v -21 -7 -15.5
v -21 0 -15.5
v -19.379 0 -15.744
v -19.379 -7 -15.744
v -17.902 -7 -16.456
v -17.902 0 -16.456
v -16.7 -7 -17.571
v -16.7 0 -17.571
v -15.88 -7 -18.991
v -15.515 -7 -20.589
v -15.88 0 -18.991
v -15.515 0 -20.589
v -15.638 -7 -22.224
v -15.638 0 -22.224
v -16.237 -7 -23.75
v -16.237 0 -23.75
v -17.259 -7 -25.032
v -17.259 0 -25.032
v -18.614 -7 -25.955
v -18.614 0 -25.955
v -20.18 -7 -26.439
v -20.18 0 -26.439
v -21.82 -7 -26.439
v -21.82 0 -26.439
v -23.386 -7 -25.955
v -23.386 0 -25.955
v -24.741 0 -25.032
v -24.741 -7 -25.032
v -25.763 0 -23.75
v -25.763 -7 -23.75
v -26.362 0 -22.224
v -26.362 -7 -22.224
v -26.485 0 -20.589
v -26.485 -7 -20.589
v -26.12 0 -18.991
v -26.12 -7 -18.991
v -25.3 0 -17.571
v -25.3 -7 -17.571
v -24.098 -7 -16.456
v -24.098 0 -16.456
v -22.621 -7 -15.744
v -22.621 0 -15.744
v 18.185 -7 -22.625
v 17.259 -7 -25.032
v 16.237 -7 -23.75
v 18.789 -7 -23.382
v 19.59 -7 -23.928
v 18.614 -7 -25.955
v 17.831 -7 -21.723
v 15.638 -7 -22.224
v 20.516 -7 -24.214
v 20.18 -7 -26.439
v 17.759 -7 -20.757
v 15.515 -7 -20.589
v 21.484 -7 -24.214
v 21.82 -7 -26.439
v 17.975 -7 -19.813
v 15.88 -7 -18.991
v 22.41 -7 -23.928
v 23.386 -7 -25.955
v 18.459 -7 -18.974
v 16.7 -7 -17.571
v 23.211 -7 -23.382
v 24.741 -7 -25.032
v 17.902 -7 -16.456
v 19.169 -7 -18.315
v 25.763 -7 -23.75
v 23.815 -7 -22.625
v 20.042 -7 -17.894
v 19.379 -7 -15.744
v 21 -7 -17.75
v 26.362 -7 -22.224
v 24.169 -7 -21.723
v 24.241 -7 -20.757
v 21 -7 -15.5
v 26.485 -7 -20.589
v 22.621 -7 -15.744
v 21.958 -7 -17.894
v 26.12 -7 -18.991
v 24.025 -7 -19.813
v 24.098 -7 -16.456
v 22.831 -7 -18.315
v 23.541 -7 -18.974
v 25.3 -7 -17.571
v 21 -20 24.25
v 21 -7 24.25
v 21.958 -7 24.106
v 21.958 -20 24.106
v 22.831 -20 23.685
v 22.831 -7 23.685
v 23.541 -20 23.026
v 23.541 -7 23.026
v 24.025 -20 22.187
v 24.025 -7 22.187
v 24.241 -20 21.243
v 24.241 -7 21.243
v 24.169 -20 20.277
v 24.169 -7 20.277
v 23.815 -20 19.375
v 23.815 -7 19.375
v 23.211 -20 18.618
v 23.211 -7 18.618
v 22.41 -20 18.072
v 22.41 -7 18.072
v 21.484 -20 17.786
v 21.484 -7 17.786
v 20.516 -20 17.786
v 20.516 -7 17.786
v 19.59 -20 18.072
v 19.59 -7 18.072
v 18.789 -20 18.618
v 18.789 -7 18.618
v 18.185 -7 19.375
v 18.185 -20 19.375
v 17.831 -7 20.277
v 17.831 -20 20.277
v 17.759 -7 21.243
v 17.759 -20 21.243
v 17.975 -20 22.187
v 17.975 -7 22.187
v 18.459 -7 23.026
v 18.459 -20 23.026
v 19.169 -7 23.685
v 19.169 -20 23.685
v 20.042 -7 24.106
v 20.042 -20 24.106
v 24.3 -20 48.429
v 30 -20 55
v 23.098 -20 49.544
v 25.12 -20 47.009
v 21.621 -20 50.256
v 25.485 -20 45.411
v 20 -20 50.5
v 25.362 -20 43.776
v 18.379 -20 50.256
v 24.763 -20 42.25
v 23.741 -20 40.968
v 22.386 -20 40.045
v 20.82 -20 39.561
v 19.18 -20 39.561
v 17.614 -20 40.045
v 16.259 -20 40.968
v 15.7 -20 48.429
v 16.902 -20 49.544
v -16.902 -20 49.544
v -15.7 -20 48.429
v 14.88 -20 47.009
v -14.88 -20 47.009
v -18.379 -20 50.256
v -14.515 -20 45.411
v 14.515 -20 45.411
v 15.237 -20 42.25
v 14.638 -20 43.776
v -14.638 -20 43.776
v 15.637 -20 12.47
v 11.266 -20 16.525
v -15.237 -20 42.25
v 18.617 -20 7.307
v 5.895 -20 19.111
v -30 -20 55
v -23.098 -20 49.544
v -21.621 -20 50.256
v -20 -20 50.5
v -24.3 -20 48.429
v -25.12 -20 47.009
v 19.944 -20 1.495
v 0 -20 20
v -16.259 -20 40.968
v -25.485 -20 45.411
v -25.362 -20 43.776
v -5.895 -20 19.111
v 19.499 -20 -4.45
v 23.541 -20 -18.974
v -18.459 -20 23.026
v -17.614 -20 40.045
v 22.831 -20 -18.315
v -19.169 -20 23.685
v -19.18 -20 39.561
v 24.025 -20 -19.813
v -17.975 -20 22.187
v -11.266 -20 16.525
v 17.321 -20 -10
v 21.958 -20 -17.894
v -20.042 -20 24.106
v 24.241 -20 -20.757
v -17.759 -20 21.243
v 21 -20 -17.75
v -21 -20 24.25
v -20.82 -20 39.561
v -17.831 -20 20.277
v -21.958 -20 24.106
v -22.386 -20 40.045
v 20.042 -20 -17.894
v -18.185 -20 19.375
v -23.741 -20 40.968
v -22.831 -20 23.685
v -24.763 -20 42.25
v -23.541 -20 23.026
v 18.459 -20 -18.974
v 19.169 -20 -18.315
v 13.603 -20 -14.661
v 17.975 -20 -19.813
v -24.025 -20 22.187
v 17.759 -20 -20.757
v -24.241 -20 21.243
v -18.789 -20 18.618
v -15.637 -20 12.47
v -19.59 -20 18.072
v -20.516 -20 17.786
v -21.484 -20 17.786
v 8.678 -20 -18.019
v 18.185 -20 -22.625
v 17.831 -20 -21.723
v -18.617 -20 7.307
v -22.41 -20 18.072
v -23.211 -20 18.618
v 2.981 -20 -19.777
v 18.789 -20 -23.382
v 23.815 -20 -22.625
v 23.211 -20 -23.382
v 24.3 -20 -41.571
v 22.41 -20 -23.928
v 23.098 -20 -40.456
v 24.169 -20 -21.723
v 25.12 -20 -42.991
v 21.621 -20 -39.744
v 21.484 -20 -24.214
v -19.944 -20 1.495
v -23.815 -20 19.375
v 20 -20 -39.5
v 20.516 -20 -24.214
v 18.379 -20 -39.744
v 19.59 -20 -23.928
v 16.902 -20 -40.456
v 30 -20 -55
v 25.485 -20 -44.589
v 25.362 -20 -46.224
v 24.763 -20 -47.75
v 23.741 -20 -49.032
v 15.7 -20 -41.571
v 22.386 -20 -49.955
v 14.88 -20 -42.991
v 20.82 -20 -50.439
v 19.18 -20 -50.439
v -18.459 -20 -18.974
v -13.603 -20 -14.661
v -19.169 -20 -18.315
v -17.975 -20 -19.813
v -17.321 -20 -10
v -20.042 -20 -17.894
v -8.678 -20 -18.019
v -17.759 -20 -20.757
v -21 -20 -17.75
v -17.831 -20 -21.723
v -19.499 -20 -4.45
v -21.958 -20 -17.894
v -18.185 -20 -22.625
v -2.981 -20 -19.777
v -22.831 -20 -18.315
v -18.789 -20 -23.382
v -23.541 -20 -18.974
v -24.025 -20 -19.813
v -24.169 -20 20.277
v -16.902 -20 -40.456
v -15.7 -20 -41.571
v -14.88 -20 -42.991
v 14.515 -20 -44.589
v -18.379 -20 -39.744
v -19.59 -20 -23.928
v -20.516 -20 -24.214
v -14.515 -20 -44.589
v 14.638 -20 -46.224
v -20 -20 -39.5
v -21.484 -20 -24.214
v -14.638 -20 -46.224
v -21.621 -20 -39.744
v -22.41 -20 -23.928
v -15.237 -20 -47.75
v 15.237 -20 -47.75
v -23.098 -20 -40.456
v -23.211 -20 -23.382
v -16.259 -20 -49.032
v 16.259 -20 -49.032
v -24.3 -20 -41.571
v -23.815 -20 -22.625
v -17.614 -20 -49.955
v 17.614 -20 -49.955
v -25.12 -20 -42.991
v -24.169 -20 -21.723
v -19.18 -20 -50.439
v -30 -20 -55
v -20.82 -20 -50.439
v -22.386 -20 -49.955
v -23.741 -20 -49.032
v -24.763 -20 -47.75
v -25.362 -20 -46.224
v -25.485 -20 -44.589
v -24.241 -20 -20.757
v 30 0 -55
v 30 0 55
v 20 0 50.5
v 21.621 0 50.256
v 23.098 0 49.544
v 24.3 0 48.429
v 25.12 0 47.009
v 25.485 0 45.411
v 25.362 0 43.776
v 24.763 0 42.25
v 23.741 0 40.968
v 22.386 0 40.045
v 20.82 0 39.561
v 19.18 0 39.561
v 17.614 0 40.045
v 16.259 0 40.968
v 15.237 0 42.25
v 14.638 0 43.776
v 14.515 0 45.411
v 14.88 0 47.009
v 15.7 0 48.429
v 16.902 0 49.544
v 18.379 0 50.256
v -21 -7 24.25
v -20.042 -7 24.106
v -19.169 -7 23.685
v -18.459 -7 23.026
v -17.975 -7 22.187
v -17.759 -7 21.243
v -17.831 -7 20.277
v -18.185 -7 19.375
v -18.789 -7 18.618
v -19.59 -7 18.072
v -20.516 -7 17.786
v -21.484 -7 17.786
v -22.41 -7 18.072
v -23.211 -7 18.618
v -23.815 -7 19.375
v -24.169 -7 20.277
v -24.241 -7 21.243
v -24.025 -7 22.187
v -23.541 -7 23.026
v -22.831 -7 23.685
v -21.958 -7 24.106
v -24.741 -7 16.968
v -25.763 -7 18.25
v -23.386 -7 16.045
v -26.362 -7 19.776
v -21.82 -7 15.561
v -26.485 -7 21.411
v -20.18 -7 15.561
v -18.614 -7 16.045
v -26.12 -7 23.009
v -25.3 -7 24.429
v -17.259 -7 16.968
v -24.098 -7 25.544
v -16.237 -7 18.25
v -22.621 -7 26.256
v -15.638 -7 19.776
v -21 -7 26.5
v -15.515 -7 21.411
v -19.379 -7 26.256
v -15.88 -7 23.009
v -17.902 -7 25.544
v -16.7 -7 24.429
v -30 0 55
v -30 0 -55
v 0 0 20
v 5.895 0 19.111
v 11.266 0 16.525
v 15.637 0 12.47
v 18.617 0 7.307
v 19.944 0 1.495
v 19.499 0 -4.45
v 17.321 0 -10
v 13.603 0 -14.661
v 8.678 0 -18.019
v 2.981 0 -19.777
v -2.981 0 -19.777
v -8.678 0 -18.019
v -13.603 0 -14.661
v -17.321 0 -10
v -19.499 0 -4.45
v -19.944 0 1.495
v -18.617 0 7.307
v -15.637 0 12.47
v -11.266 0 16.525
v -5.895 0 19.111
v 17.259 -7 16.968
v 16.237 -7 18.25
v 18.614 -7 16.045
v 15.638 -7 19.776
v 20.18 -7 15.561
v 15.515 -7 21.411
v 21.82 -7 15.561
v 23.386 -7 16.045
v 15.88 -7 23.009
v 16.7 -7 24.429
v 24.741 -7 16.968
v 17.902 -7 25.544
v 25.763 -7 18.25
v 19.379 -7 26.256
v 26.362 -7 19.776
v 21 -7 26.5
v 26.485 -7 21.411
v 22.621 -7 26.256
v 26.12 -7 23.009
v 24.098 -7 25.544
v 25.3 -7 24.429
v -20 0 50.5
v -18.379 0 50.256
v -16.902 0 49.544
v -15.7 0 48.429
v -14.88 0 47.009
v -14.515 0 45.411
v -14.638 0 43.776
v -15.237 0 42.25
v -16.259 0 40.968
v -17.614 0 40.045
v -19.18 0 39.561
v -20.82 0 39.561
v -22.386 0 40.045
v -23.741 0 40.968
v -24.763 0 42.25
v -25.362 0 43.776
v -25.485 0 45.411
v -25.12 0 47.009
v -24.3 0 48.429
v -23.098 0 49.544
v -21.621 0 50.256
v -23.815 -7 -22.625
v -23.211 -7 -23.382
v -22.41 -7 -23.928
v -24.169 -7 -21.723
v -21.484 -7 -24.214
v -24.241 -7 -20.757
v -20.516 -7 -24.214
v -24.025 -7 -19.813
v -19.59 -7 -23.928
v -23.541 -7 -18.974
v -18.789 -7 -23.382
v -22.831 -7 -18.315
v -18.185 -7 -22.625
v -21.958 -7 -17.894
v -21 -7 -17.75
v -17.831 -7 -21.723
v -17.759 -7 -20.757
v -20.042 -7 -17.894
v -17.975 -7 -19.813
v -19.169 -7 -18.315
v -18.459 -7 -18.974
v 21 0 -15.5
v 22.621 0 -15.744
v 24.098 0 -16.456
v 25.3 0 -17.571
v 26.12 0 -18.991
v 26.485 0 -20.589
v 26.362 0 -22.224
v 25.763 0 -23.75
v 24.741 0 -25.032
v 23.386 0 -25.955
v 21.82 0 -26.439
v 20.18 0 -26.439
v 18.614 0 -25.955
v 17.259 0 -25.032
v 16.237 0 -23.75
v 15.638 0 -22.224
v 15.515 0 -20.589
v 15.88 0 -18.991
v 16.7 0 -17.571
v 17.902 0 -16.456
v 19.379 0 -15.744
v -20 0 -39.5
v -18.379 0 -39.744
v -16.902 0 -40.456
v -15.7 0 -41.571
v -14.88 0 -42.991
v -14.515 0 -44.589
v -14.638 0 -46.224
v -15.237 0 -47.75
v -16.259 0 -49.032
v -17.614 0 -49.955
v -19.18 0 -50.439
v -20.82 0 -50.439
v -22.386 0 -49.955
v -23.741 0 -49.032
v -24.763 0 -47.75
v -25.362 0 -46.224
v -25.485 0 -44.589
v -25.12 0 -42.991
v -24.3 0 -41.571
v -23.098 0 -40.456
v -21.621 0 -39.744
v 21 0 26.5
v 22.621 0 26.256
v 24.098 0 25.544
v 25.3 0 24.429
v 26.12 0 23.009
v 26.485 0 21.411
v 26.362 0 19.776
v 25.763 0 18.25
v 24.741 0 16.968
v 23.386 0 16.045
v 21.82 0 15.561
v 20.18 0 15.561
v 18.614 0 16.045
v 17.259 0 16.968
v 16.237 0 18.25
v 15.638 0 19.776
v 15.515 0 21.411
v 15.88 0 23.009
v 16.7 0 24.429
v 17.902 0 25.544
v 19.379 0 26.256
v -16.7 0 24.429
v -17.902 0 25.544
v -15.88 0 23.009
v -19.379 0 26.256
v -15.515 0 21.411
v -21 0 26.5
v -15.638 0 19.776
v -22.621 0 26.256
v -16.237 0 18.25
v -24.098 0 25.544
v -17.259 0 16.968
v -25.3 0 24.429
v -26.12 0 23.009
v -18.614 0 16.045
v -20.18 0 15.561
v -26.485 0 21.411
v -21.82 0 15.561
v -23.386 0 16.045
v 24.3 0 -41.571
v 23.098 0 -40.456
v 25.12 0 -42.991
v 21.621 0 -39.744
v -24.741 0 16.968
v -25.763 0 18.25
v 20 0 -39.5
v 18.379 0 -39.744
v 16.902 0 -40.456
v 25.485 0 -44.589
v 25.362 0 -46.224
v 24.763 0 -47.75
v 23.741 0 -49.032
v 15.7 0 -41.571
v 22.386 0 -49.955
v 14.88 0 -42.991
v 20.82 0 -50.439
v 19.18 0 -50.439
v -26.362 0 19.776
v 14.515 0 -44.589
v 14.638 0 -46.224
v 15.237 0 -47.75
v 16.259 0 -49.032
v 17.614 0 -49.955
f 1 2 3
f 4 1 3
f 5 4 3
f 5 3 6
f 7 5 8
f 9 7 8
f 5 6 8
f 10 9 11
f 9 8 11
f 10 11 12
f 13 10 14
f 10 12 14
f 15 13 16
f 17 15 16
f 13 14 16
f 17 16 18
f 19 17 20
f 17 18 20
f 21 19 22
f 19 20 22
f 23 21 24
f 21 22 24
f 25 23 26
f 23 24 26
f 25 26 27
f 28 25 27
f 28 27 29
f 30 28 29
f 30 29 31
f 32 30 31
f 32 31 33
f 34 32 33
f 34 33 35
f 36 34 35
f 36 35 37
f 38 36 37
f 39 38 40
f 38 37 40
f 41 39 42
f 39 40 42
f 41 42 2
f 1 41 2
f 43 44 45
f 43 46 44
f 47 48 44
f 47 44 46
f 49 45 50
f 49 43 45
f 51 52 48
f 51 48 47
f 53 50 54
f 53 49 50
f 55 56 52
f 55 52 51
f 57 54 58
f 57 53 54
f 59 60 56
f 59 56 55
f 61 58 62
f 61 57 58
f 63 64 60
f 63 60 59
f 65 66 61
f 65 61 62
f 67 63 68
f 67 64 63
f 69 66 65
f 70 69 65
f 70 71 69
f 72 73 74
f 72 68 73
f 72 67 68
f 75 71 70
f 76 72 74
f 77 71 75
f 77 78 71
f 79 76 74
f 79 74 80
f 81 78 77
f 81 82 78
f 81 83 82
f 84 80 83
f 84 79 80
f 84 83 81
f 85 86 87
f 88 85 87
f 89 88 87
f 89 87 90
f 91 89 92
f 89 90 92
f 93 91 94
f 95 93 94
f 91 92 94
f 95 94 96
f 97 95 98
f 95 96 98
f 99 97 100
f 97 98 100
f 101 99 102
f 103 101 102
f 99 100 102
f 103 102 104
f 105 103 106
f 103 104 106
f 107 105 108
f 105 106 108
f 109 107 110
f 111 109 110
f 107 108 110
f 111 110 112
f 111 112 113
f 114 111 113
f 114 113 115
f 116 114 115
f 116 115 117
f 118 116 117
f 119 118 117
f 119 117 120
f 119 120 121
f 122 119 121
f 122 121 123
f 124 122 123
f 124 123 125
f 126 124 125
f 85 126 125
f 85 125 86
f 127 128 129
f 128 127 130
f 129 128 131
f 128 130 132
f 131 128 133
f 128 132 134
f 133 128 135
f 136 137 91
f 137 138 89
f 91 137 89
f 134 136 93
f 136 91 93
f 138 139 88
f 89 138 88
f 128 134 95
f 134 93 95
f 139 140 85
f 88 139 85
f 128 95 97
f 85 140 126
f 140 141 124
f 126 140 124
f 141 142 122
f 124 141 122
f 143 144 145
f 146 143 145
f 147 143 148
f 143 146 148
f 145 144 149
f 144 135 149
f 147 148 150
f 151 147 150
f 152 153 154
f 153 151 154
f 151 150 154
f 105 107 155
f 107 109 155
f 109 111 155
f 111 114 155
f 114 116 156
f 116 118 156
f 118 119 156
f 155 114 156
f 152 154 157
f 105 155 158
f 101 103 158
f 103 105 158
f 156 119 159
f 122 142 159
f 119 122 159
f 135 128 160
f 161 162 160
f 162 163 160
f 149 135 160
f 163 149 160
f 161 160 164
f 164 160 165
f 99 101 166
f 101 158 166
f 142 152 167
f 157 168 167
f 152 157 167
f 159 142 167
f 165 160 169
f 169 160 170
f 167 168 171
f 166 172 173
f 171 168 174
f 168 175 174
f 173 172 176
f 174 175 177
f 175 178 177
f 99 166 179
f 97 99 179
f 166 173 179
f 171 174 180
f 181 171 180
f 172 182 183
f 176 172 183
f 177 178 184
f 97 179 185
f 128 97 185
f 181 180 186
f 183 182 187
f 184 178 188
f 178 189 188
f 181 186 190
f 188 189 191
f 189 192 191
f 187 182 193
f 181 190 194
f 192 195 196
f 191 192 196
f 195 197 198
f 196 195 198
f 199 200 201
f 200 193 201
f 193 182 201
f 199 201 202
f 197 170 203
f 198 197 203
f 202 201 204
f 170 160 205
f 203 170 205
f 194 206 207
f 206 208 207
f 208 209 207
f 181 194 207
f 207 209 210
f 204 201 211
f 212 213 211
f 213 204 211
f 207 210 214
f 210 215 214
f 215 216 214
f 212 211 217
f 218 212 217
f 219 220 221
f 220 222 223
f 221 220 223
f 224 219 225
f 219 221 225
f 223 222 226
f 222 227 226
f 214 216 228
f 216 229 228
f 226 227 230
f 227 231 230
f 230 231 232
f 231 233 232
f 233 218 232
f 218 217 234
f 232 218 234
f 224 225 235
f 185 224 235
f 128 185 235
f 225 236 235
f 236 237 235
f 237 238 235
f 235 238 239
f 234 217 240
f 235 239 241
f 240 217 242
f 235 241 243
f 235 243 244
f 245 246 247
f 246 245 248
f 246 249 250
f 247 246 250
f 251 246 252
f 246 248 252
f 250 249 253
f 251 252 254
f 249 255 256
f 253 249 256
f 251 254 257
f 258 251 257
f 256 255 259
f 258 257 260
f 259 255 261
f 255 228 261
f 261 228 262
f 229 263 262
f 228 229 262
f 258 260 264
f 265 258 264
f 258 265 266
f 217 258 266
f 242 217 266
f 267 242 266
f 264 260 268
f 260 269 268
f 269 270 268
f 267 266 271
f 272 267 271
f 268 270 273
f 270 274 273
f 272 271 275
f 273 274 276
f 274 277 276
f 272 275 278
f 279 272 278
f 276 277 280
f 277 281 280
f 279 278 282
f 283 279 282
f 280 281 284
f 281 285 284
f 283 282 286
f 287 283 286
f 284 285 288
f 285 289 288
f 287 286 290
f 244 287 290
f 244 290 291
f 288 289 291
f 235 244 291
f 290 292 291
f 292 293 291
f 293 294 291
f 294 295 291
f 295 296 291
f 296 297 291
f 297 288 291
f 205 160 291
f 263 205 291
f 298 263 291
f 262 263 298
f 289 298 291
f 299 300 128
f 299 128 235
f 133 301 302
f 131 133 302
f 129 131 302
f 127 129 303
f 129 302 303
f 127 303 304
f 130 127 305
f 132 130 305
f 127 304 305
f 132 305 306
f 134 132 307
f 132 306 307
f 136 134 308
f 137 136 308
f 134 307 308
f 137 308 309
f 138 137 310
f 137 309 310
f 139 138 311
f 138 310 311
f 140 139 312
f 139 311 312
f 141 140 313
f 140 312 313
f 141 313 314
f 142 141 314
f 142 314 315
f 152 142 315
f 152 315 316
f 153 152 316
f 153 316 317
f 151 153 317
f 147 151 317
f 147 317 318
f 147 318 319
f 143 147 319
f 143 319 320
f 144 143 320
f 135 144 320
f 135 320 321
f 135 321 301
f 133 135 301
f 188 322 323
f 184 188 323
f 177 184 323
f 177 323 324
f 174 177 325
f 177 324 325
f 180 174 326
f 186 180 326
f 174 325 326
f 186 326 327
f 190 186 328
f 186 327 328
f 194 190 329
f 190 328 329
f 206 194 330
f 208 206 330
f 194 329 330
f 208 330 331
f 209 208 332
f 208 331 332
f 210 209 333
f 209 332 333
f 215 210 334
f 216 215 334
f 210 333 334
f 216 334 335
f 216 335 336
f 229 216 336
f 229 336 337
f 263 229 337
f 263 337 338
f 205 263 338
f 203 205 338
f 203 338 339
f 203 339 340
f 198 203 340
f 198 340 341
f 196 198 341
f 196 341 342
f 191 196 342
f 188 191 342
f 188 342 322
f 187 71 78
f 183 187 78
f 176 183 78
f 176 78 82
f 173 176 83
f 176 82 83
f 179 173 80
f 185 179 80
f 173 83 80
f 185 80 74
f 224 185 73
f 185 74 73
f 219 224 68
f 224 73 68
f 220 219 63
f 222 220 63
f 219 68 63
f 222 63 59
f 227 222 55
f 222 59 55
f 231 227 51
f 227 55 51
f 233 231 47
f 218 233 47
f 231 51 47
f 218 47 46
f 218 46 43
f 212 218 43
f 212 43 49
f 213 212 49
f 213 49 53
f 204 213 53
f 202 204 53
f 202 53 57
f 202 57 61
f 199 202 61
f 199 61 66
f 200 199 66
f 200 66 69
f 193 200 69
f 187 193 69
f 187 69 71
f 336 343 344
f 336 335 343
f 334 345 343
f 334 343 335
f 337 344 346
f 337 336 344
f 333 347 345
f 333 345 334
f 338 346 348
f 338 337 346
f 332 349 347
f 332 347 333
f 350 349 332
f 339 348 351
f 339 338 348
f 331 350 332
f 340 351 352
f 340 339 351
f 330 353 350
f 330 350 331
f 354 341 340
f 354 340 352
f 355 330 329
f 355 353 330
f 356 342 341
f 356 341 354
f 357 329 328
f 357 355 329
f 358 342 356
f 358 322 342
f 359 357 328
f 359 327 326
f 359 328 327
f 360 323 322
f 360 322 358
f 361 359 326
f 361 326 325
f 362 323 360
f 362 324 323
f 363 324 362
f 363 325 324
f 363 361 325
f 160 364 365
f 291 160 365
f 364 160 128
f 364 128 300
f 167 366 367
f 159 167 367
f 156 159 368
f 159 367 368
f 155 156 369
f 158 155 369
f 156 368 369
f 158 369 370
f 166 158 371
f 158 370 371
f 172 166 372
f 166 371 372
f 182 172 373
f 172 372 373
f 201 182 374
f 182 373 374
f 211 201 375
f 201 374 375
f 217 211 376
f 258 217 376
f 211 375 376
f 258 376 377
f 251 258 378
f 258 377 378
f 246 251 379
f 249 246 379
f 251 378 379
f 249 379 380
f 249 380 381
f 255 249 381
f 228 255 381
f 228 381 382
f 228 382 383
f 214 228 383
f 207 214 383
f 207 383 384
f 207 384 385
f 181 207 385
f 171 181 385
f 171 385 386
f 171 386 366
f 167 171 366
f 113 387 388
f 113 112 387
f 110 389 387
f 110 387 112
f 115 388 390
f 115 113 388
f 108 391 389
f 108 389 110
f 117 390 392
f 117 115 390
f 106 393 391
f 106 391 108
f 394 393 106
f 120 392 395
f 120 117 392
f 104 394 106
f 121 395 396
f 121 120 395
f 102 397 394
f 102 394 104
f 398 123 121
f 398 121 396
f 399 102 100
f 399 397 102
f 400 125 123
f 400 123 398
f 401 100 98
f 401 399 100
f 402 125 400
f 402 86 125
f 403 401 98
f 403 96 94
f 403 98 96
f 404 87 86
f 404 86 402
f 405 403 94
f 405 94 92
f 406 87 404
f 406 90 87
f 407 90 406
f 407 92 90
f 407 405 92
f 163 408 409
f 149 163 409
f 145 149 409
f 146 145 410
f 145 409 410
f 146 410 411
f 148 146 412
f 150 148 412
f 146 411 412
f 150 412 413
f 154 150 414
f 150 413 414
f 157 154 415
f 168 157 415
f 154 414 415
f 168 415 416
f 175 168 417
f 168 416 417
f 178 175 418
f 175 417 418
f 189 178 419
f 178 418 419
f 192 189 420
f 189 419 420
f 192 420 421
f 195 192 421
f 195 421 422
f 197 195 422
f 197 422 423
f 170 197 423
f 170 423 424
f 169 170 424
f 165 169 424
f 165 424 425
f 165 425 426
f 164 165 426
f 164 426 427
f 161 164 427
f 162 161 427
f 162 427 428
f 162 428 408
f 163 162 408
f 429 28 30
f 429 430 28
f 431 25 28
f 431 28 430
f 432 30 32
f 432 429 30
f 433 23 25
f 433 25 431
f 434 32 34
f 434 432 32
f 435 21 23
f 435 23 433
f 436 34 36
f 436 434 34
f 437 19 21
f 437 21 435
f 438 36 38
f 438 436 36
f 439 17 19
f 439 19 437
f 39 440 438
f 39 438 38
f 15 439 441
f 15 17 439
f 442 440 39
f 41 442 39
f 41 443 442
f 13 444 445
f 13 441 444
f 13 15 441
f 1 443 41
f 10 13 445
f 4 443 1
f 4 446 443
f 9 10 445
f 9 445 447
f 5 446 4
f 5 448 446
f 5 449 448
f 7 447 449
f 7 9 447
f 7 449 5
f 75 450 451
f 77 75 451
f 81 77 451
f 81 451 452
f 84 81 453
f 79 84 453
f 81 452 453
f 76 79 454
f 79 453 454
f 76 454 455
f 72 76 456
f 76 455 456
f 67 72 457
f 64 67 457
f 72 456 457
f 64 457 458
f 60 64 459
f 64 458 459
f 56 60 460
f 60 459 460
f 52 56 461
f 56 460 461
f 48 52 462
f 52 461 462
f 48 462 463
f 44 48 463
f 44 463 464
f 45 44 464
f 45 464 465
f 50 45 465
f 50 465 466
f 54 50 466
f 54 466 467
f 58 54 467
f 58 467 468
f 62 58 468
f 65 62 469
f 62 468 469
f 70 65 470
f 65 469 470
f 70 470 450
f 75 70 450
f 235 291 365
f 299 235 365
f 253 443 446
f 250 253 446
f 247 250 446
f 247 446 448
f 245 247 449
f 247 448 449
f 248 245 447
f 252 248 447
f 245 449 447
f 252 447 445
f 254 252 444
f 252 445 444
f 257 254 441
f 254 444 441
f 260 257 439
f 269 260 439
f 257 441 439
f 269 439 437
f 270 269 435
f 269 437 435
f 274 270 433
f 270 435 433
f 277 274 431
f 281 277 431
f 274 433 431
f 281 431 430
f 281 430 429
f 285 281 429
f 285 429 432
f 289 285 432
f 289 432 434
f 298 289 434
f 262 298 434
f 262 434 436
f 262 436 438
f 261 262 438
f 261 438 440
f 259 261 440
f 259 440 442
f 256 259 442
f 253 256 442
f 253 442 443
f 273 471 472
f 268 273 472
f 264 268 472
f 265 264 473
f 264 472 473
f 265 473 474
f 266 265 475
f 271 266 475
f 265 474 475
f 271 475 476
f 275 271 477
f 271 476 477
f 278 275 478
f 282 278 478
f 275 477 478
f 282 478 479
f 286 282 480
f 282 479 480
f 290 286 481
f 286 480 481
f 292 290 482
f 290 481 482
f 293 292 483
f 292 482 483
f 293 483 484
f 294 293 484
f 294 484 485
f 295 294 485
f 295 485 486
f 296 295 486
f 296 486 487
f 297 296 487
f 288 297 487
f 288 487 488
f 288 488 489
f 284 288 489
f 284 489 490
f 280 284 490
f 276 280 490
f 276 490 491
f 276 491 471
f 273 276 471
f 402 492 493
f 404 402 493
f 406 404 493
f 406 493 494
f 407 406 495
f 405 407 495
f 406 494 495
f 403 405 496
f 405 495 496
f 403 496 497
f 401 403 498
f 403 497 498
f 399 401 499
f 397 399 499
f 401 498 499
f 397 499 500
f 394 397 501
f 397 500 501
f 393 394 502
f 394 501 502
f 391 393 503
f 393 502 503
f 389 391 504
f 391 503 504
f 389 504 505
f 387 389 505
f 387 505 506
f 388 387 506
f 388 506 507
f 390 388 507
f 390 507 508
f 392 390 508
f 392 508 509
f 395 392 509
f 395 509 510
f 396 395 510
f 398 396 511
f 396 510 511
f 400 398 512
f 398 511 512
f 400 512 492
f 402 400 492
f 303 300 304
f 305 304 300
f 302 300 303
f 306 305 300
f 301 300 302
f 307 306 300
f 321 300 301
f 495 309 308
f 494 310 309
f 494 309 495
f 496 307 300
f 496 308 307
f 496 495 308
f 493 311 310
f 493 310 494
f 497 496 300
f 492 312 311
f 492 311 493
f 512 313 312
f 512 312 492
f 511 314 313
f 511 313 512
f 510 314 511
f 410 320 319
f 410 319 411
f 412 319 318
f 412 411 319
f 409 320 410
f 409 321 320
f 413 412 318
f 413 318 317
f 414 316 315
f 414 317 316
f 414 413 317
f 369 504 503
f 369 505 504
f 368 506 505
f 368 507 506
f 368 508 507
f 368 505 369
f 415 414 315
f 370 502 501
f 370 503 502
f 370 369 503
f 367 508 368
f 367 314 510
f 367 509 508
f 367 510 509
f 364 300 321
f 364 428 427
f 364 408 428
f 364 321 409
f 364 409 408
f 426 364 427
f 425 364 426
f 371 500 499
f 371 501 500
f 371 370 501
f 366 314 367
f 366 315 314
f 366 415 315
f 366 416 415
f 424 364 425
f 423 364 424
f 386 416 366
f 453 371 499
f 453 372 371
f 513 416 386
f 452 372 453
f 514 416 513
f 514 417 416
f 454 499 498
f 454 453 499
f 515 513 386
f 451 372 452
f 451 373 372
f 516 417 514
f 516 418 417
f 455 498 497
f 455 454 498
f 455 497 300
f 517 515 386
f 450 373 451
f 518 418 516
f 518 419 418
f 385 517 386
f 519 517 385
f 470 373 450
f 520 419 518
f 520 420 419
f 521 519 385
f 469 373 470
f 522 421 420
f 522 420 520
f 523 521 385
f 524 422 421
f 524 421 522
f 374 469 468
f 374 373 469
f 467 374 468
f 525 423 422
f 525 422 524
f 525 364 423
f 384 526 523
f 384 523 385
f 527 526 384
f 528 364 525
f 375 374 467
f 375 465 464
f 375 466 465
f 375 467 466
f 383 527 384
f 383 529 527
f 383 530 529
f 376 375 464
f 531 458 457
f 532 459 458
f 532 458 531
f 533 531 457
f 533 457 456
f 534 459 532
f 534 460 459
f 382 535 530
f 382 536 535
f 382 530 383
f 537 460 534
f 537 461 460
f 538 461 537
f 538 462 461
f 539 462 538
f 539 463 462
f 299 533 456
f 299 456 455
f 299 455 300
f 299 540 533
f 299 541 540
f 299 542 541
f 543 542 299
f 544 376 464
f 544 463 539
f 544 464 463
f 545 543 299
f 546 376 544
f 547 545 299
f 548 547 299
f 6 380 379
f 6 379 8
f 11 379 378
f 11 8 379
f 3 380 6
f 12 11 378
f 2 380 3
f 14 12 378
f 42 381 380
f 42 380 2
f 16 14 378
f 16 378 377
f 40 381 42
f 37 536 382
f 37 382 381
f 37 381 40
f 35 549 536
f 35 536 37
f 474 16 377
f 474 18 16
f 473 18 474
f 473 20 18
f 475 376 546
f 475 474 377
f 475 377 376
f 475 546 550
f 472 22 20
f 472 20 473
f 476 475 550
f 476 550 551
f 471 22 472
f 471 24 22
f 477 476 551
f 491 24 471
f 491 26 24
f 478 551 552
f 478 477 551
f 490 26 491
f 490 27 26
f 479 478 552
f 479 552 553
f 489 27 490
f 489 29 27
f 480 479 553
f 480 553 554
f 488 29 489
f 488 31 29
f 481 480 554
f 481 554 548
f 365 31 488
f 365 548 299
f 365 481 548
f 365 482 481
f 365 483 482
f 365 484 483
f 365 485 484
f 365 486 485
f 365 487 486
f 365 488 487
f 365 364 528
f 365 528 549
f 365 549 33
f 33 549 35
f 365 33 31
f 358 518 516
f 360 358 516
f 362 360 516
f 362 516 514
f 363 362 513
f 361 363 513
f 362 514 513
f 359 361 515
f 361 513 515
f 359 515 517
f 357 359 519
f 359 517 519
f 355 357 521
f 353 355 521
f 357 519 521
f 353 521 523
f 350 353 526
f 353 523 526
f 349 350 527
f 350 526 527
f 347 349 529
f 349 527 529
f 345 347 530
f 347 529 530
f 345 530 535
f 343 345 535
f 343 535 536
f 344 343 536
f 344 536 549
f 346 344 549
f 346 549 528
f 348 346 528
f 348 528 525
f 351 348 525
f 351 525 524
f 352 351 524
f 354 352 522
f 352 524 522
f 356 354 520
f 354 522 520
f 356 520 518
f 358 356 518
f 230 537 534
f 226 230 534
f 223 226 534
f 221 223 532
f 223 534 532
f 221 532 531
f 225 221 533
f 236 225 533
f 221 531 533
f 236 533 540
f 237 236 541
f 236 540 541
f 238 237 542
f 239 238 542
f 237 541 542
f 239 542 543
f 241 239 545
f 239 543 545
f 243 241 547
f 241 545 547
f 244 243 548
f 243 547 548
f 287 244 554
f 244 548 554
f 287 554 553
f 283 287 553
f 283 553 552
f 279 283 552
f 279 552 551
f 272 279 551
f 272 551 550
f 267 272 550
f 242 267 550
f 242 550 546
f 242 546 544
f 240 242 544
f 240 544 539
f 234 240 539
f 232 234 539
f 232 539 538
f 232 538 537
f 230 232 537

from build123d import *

# Parameters (mm, degrees)
SALIENTE_EXTRUIR1_DEPTH      = 30
SALIENTE_EXTRUIR1_DEPTH_BACK = 30
CROQUIS1_W                   = 110
CROQUIS1_H                   = 20
CORTAR_EXTRUIR1_REACH        = 67.765
CROQUIS2_R                   = 20
CROQUIS3_R                   = 5.5
CORTAR_EXTRUIR2_DEPTH        = 7
CORTAR_EXTRUIR3_REACH        = 65.984
CROQUIS4_R                   = 3.25
CORTAR_EXTRUIR4_REACH        = 67.765
CROQUIS5_R                   = 5.5


with BuildPart() as part:
    # Croquis1 → Saliente-Extruir1 (new, two sides: drawn at the far end of the back side and taken through both)
    with BuildSketch(Plane(origin=(0, 0, 0), x_dir=(0, 0, -1), z_dir=(1, 0, 0)).offset(-SALIENTE_EXTRUIR1_DEPTH_BACK)):
        with Locations((0, -10)):
            Rectangle(CROQUIS1_W, CROQUIS1_H)
    extrude(amount=SALIENTE_EXTRUIR1_DEPTH + SALIENTE_EXTRUIR1_DEPTH_BACK)

    # Croquis2 → Cortar-Extruir1 (cut, up to next)
    with BuildSketch(Plane(origin=(0, 0, 0), x_dir=(1, 0, 0), z_dir=(0, 1, 0)), mode=Mode.PRIVATE) as cortar_extruir1_sk1:
        Circle(CROQUIS2_R)
    cortar_extruir1_tool1 = extrude(cortar_extruir1_sk1.sketch, amount=-CORTAR_EXTRUIR1_REACH, mode=Mode.PRIVATE) & part.part
    add(cortar_extruir1_tool1.solids().sort_by_distance((0, 0, 0))[0], mode=Mode.SUBTRACT)

    # Croquis3 → Cortar-Extruir2 (cut)
    with BuildSketch(Plane(origin=(0, 0, 0), x_dir=(1, 0, 0), z_dir=(0, 1, 0))):
        with Locations((-21, 21)):
            Circle(CROQUIS3_R)
        with Locations((21, 21)):
            Circle(CROQUIS3_R)
        with Locations((21, -21)):
            Circle(CROQUIS3_R)
        with Locations((-21, -21)):
            Circle(CROQUIS3_R)
    extrude(amount=-CORTAR_EXTRUIR2_DEPTH, mode=Mode.SUBTRACT)

    # Croquis4 → Cortar-Extruir3 (cut, up to next)
    with BuildSketch(Plane(origin=(0, -7, 0), x_dir=(1, 0, 0), z_dir=(0, 1, 0)), mode=Mode.PRIVATE) as cortar_extruir3_sk1:
        with Locations((-21, 21)):
            Circle(CROQUIS4_R)
    cortar_extruir3_tool1 = extrude(cortar_extruir3_sk1.sketch, amount=-CORTAR_EXTRUIR3_REACH, mode=Mode.PRIVATE) & part.part
    # Croquis4 → Cortar-Extruir3 (cut, up to next)
    with BuildSketch(Plane(origin=(0, -7, 0), x_dir=(1, 0, 0), z_dir=(0, 1, 0)), mode=Mode.PRIVATE) as cortar_extruir3_sk2:
        with Locations((21, 21)):
            Circle(CROQUIS4_R)
    cortar_extruir3_tool2 = extrude(cortar_extruir3_sk2.sketch, amount=-CORTAR_EXTRUIR3_REACH, mode=Mode.PRIVATE) & part.part
    # Croquis4 → Cortar-Extruir3 (cut, up to next)
    with BuildSketch(Plane(origin=(0, -7, 0), x_dir=(1, 0, 0), z_dir=(0, 1, 0)), mode=Mode.PRIVATE) as cortar_extruir3_sk3:
        with Locations((21, -21)):
            Circle(CROQUIS4_R)
    cortar_extruir3_tool3 = extrude(cortar_extruir3_sk3.sketch, amount=-CORTAR_EXTRUIR3_REACH, mode=Mode.PRIVATE) & part.part
    # Croquis4 → Cortar-Extruir3 (cut, up to next)
    with BuildSketch(Plane(origin=(0, -7, 0), x_dir=(1, 0, 0), z_dir=(0, 1, 0)), mode=Mode.PRIVATE) as cortar_extruir3_sk4:
        with Locations((-21, -21)):
            Circle(CROQUIS4_R)
    cortar_extruir3_tool4 = extrude(cortar_extruir3_sk4.sketch, amount=-CORTAR_EXTRUIR3_REACH, mode=Mode.PRIVATE) & part.part
    add(cortar_extruir3_tool1.solids().sort_by_distance((-21, -7, -21))[0], mode=Mode.SUBTRACT)
    add(cortar_extruir3_tool2.solids().sort_by_distance((21, -7, -21))[0], mode=Mode.SUBTRACT)
    add(cortar_extruir3_tool3.solids().sort_by_distance((21, -7, 21))[0], mode=Mode.SUBTRACT)
    add(cortar_extruir3_tool4.solids().sort_by_distance((-21, -7, 21))[0], mode=Mode.SUBTRACT)

    # Croquis5 → Cortar-Extruir4 (cut, up to next)
    with BuildSketch(Plane(origin=(0, 0, 0), x_dir=(1, 0, 0), z_dir=(0, 1, 0)), mode=Mode.PRIVATE) as cortar_extruir4_sk1:
        with Locations((-20, 45)):
            Circle(CROQUIS5_R)
    cortar_extruir4_tool1 = extrude(cortar_extruir4_sk1.sketch, amount=-CORTAR_EXTRUIR4_REACH, mode=Mode.PRIVATE) & part.part
    # Croquis5 → Cortar-Extruir4 (cut, up to next)
    with BuildSketch(Plane(origin=(0, 0, 0), x_dir=(1, 0, 0), z_dir=(0, 1, 0)), mode=Mode.PRIVATE) as cortar_extruir4_sk2:
        with Locations((20, 45)):
            Circle(CROQUIS5_R)
    cortar_extruir4_tool2 = extrude(cortar_extruir4_sk2.sketch, amount=-CORTAR_EXTRUIR4_REACH, mode=Mode.PRIVATE) & part.part
    # Croquis5 → Cortar-Extruir4 (cut, up to next)
    with BuildSketch(Plane(origin=(0, 0, 0), x_dir=(1, 0, 0), z_dir=(0, 1, 0)), mode=Mode.PRIVATE) as cortar_extruir4_sk3:
        with Locations((20, -45)):
            Circle(CROQUIS5_R)
    cortar_extruir4_tool3 = extrude(cortar_extruir4_sk3.sketch, amount=-CORTAR_EXTRUIR4_REACH, mode=Mode.PRIVATE) & part.part
    # Croquis5 → Cortar-Extruir4 (cut, up to next)
    with BuildSketch(Plane(origin=(0, 0, 0), x_dir=(1, 0, 0), z_dir=(0, 1, 0)), mode=Mode.PRIVATE) as cortar_extruir4_sk4:
        with Locations((-20, -45)):
            Circle(CROQUIS5_R)
    cortar_extruir4_tool4 = extrude(cortar_extruir4_sk4.sketch, amount=-CORTAR_EXTRUIR4_REACH, mode=Mode.PRIVATE) & part.part
    add(cortar_extruir4_tool1.solids().sort_by_distance((-20, 0, -45))[0], mode=Mode.SUBTRACT)
    add(cortar_extruir4_tool2.solids().sort_by_distance((20, 0, -45))[0], mode=Mode.SUBTRACT)
    add(cortar_extruir4_tool3.solids().sort_by_distance((20, 0, 45))[0], mode=Mode.SUBTRACT)
    add(cortar_extruir4_tool4.solids().sort_by_distance((-20, 0, 45))[0], mode=Mode.SUBTRACT)


solid = part.part
